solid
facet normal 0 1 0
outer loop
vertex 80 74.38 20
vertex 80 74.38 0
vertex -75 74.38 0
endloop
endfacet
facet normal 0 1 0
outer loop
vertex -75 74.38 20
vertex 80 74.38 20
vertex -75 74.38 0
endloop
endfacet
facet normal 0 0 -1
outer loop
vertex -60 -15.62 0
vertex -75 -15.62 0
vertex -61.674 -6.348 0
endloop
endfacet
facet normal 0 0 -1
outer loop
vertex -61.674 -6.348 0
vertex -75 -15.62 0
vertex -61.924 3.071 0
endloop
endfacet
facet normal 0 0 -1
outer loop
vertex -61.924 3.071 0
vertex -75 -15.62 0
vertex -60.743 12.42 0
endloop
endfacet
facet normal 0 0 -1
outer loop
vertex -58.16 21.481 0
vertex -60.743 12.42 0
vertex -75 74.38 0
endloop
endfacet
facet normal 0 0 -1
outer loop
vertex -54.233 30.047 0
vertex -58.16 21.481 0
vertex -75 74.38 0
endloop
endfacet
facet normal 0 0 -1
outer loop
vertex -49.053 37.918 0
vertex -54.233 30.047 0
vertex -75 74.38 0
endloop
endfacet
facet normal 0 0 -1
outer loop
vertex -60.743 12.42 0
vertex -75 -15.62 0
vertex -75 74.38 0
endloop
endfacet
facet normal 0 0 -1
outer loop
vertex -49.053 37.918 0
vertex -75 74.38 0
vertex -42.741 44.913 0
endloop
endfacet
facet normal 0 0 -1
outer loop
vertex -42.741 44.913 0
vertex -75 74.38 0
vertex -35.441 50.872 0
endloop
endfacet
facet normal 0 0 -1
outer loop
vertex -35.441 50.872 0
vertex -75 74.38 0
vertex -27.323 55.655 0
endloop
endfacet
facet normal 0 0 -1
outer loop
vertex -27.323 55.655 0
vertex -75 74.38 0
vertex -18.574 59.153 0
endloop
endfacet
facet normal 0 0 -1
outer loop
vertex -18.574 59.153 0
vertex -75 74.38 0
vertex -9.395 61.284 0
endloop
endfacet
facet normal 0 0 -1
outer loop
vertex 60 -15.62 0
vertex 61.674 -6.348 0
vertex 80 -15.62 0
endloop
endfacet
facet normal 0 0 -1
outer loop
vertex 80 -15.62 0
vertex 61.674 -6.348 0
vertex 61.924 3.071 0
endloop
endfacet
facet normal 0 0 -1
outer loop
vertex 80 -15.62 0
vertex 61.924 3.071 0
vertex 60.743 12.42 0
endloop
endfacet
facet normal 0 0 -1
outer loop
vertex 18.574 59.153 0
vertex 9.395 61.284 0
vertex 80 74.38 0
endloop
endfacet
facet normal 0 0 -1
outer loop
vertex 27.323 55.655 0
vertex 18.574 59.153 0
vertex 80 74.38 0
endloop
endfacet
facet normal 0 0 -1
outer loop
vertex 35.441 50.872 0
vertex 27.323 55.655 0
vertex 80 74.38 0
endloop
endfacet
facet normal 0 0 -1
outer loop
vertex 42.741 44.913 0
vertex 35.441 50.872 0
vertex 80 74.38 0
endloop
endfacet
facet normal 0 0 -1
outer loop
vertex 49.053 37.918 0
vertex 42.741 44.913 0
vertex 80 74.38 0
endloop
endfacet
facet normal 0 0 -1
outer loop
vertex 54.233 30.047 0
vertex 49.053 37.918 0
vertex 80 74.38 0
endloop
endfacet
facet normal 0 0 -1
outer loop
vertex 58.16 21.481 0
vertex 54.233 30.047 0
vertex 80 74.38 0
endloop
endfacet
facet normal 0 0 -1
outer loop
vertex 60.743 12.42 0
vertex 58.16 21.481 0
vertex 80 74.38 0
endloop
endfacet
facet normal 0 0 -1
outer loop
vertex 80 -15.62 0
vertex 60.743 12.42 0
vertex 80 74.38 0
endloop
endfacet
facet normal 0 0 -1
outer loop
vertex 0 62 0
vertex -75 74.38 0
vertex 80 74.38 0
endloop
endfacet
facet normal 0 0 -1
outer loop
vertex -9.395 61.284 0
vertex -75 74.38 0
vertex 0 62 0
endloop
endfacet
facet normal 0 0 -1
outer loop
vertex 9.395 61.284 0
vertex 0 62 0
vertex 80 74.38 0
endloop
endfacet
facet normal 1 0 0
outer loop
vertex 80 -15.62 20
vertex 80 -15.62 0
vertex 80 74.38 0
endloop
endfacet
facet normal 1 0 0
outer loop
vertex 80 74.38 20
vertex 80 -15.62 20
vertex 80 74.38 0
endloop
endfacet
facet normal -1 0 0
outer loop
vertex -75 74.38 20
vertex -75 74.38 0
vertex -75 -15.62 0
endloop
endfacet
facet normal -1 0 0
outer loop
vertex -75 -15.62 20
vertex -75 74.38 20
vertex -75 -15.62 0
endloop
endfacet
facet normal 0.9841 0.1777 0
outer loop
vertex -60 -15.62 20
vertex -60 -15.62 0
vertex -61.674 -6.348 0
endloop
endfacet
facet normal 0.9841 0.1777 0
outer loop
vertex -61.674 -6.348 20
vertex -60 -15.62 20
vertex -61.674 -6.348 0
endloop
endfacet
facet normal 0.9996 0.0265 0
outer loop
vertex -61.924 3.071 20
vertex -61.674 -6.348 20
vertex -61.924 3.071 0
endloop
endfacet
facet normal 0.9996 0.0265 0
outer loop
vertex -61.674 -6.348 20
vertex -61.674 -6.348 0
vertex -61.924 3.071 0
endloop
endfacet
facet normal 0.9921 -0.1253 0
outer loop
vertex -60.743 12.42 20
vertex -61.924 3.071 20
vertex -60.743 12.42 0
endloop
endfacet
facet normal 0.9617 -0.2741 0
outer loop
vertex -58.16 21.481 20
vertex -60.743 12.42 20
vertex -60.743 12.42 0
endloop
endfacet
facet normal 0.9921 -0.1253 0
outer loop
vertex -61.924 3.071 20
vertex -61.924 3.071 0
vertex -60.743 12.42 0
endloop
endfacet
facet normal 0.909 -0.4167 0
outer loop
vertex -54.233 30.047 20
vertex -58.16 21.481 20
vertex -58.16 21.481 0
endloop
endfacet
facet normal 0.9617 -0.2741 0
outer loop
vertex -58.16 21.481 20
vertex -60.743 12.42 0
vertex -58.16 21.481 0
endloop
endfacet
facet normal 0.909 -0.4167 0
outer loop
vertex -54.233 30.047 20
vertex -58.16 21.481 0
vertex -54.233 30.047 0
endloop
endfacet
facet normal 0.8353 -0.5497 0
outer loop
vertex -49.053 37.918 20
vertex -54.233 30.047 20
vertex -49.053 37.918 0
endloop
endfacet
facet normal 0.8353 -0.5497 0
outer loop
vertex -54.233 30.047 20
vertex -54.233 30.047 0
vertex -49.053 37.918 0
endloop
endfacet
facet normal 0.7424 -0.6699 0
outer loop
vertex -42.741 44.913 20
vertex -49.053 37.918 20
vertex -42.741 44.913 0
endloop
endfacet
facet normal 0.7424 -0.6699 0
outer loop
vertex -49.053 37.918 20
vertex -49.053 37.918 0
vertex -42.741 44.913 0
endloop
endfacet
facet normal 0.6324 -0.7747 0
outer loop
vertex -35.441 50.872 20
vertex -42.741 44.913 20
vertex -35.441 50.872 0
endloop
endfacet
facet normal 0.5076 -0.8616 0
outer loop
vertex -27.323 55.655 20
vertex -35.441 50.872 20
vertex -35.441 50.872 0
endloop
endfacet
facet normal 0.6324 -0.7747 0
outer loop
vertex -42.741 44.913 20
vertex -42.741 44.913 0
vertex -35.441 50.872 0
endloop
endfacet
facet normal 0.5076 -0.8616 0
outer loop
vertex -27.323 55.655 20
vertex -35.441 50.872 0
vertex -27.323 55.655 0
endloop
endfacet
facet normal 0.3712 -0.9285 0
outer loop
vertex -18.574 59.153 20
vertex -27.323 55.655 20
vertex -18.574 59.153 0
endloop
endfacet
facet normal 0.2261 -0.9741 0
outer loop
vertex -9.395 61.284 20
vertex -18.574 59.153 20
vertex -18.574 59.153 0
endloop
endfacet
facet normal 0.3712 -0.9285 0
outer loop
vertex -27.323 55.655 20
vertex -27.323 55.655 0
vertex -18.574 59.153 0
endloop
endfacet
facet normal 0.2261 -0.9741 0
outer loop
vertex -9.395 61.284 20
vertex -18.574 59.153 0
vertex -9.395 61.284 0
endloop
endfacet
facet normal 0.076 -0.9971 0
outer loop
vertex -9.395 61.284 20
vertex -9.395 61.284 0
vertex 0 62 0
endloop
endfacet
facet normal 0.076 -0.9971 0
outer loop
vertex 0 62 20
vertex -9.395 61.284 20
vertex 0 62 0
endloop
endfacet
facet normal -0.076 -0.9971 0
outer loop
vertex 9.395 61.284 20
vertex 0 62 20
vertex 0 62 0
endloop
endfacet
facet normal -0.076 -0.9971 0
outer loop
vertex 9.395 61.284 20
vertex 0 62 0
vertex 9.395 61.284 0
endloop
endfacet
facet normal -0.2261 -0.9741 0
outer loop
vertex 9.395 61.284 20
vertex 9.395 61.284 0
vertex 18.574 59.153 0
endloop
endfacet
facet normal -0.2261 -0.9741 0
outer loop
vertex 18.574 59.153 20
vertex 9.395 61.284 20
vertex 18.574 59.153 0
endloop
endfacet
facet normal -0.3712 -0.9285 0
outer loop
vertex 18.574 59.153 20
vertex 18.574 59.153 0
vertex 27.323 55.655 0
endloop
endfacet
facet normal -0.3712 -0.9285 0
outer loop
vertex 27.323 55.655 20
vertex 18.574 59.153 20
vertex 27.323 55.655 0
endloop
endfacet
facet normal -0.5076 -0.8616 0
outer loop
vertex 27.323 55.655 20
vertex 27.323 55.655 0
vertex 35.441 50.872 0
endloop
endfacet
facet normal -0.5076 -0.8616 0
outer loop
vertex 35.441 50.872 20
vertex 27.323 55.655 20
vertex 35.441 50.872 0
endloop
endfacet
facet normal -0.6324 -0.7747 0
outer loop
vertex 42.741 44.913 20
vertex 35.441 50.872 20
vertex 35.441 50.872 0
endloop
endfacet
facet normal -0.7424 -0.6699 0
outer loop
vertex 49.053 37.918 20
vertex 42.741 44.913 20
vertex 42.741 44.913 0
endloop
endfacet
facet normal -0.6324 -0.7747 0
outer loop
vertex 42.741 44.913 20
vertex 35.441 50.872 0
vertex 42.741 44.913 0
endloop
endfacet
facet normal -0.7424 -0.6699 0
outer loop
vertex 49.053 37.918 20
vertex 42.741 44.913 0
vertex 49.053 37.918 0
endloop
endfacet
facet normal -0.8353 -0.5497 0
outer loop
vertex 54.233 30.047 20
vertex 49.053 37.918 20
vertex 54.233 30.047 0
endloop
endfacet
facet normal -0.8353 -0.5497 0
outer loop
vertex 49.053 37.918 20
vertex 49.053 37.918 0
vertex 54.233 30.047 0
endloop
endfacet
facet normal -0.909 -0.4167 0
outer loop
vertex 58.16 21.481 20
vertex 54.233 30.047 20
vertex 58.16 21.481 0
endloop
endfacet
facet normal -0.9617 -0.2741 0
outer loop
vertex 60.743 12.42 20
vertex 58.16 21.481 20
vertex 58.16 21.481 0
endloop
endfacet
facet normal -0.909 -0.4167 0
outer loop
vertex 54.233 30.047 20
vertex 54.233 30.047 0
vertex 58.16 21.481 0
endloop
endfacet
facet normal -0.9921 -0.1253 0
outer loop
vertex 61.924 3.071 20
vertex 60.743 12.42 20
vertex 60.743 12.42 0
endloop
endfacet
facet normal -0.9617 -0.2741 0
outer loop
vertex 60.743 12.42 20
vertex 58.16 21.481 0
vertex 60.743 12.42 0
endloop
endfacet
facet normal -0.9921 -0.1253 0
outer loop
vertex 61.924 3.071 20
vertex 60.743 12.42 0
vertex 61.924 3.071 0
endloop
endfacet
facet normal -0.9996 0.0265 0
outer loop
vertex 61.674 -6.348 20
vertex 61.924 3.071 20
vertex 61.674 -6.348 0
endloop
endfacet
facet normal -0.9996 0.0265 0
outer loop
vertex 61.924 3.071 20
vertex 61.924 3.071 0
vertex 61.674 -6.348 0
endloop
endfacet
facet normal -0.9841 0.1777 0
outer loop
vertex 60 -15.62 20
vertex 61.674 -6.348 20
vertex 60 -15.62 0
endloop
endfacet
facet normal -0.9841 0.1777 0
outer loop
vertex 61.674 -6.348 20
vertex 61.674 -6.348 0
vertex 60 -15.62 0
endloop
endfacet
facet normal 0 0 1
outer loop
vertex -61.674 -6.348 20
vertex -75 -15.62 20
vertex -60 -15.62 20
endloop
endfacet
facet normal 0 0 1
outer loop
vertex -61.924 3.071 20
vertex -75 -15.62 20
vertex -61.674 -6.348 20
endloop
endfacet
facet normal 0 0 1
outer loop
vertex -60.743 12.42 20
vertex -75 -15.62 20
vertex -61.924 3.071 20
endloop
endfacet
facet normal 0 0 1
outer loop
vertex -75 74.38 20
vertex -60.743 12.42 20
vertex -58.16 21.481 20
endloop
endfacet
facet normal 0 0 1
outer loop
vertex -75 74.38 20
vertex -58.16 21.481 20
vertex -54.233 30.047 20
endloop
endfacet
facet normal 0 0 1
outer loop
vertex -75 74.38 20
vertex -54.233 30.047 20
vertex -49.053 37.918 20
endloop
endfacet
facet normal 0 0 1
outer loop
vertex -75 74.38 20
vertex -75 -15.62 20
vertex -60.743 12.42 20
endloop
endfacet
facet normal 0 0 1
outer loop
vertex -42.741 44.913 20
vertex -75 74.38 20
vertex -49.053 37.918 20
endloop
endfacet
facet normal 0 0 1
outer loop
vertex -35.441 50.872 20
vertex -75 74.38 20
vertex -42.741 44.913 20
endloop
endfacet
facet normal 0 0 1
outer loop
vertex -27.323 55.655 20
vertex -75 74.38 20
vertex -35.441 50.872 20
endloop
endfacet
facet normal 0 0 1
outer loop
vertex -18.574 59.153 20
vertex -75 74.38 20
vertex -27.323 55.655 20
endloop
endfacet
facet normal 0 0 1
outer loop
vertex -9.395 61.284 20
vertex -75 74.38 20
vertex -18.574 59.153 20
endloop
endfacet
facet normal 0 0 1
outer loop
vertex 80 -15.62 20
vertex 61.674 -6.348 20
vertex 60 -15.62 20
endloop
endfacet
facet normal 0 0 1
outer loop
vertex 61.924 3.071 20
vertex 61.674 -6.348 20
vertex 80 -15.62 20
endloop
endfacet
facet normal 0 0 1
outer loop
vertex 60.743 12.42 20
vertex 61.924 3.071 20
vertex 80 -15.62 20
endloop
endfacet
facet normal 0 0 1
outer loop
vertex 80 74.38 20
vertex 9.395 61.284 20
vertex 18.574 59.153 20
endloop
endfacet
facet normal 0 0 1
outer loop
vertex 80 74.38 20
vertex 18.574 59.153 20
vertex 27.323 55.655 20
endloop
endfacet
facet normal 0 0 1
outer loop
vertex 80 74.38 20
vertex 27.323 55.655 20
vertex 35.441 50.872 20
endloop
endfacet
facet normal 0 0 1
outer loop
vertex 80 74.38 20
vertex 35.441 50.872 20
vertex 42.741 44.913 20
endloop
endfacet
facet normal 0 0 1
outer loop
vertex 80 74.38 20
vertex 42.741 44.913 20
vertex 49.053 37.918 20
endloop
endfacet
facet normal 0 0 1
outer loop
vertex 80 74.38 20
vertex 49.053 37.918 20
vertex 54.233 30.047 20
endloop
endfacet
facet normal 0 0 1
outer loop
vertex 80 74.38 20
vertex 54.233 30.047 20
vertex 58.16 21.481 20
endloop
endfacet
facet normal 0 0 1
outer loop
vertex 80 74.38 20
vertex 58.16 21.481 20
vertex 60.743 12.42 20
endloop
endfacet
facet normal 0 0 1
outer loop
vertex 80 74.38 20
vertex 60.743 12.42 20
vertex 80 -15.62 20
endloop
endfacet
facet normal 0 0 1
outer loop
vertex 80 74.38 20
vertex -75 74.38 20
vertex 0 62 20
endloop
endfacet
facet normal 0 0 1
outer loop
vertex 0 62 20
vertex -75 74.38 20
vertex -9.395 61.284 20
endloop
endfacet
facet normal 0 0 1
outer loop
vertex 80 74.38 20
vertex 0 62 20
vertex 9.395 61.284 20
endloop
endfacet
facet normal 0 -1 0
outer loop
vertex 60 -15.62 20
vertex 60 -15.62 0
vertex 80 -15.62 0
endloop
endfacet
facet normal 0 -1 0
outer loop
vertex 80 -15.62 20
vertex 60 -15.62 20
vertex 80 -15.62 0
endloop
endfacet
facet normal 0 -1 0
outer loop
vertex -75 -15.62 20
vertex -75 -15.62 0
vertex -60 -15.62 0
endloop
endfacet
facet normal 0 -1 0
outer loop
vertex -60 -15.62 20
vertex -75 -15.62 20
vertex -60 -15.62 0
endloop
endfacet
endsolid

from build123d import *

# Parameters (mm, degrees)
BOSS_EXTRUDE1_DEPTH = 20


with BuildPart() as part:
    # Sketch1 → Boss-Extrude1 (new body)
    with BuildSketch(Plane.XY):
        with BuildLine():
            Line((-75, 74.379500648), (-75, -15.620499352))
            Line((-75, -15.620499352), (-60, -15.620499352))
            ThreePointArc((-60, -15.620499352), (0, 62), (60, -15.620499352))
            Line((60, -15.620499352), (80, -15.620499352))
            Line((80, -15.620499352), (80, 74.379500648))
            Line((80, 74.379500648), (-75, 74.379500648))
        make_face()
    extrude(amount=BOSS_EXTRUDE1_DEPTH)


solid = part.part
